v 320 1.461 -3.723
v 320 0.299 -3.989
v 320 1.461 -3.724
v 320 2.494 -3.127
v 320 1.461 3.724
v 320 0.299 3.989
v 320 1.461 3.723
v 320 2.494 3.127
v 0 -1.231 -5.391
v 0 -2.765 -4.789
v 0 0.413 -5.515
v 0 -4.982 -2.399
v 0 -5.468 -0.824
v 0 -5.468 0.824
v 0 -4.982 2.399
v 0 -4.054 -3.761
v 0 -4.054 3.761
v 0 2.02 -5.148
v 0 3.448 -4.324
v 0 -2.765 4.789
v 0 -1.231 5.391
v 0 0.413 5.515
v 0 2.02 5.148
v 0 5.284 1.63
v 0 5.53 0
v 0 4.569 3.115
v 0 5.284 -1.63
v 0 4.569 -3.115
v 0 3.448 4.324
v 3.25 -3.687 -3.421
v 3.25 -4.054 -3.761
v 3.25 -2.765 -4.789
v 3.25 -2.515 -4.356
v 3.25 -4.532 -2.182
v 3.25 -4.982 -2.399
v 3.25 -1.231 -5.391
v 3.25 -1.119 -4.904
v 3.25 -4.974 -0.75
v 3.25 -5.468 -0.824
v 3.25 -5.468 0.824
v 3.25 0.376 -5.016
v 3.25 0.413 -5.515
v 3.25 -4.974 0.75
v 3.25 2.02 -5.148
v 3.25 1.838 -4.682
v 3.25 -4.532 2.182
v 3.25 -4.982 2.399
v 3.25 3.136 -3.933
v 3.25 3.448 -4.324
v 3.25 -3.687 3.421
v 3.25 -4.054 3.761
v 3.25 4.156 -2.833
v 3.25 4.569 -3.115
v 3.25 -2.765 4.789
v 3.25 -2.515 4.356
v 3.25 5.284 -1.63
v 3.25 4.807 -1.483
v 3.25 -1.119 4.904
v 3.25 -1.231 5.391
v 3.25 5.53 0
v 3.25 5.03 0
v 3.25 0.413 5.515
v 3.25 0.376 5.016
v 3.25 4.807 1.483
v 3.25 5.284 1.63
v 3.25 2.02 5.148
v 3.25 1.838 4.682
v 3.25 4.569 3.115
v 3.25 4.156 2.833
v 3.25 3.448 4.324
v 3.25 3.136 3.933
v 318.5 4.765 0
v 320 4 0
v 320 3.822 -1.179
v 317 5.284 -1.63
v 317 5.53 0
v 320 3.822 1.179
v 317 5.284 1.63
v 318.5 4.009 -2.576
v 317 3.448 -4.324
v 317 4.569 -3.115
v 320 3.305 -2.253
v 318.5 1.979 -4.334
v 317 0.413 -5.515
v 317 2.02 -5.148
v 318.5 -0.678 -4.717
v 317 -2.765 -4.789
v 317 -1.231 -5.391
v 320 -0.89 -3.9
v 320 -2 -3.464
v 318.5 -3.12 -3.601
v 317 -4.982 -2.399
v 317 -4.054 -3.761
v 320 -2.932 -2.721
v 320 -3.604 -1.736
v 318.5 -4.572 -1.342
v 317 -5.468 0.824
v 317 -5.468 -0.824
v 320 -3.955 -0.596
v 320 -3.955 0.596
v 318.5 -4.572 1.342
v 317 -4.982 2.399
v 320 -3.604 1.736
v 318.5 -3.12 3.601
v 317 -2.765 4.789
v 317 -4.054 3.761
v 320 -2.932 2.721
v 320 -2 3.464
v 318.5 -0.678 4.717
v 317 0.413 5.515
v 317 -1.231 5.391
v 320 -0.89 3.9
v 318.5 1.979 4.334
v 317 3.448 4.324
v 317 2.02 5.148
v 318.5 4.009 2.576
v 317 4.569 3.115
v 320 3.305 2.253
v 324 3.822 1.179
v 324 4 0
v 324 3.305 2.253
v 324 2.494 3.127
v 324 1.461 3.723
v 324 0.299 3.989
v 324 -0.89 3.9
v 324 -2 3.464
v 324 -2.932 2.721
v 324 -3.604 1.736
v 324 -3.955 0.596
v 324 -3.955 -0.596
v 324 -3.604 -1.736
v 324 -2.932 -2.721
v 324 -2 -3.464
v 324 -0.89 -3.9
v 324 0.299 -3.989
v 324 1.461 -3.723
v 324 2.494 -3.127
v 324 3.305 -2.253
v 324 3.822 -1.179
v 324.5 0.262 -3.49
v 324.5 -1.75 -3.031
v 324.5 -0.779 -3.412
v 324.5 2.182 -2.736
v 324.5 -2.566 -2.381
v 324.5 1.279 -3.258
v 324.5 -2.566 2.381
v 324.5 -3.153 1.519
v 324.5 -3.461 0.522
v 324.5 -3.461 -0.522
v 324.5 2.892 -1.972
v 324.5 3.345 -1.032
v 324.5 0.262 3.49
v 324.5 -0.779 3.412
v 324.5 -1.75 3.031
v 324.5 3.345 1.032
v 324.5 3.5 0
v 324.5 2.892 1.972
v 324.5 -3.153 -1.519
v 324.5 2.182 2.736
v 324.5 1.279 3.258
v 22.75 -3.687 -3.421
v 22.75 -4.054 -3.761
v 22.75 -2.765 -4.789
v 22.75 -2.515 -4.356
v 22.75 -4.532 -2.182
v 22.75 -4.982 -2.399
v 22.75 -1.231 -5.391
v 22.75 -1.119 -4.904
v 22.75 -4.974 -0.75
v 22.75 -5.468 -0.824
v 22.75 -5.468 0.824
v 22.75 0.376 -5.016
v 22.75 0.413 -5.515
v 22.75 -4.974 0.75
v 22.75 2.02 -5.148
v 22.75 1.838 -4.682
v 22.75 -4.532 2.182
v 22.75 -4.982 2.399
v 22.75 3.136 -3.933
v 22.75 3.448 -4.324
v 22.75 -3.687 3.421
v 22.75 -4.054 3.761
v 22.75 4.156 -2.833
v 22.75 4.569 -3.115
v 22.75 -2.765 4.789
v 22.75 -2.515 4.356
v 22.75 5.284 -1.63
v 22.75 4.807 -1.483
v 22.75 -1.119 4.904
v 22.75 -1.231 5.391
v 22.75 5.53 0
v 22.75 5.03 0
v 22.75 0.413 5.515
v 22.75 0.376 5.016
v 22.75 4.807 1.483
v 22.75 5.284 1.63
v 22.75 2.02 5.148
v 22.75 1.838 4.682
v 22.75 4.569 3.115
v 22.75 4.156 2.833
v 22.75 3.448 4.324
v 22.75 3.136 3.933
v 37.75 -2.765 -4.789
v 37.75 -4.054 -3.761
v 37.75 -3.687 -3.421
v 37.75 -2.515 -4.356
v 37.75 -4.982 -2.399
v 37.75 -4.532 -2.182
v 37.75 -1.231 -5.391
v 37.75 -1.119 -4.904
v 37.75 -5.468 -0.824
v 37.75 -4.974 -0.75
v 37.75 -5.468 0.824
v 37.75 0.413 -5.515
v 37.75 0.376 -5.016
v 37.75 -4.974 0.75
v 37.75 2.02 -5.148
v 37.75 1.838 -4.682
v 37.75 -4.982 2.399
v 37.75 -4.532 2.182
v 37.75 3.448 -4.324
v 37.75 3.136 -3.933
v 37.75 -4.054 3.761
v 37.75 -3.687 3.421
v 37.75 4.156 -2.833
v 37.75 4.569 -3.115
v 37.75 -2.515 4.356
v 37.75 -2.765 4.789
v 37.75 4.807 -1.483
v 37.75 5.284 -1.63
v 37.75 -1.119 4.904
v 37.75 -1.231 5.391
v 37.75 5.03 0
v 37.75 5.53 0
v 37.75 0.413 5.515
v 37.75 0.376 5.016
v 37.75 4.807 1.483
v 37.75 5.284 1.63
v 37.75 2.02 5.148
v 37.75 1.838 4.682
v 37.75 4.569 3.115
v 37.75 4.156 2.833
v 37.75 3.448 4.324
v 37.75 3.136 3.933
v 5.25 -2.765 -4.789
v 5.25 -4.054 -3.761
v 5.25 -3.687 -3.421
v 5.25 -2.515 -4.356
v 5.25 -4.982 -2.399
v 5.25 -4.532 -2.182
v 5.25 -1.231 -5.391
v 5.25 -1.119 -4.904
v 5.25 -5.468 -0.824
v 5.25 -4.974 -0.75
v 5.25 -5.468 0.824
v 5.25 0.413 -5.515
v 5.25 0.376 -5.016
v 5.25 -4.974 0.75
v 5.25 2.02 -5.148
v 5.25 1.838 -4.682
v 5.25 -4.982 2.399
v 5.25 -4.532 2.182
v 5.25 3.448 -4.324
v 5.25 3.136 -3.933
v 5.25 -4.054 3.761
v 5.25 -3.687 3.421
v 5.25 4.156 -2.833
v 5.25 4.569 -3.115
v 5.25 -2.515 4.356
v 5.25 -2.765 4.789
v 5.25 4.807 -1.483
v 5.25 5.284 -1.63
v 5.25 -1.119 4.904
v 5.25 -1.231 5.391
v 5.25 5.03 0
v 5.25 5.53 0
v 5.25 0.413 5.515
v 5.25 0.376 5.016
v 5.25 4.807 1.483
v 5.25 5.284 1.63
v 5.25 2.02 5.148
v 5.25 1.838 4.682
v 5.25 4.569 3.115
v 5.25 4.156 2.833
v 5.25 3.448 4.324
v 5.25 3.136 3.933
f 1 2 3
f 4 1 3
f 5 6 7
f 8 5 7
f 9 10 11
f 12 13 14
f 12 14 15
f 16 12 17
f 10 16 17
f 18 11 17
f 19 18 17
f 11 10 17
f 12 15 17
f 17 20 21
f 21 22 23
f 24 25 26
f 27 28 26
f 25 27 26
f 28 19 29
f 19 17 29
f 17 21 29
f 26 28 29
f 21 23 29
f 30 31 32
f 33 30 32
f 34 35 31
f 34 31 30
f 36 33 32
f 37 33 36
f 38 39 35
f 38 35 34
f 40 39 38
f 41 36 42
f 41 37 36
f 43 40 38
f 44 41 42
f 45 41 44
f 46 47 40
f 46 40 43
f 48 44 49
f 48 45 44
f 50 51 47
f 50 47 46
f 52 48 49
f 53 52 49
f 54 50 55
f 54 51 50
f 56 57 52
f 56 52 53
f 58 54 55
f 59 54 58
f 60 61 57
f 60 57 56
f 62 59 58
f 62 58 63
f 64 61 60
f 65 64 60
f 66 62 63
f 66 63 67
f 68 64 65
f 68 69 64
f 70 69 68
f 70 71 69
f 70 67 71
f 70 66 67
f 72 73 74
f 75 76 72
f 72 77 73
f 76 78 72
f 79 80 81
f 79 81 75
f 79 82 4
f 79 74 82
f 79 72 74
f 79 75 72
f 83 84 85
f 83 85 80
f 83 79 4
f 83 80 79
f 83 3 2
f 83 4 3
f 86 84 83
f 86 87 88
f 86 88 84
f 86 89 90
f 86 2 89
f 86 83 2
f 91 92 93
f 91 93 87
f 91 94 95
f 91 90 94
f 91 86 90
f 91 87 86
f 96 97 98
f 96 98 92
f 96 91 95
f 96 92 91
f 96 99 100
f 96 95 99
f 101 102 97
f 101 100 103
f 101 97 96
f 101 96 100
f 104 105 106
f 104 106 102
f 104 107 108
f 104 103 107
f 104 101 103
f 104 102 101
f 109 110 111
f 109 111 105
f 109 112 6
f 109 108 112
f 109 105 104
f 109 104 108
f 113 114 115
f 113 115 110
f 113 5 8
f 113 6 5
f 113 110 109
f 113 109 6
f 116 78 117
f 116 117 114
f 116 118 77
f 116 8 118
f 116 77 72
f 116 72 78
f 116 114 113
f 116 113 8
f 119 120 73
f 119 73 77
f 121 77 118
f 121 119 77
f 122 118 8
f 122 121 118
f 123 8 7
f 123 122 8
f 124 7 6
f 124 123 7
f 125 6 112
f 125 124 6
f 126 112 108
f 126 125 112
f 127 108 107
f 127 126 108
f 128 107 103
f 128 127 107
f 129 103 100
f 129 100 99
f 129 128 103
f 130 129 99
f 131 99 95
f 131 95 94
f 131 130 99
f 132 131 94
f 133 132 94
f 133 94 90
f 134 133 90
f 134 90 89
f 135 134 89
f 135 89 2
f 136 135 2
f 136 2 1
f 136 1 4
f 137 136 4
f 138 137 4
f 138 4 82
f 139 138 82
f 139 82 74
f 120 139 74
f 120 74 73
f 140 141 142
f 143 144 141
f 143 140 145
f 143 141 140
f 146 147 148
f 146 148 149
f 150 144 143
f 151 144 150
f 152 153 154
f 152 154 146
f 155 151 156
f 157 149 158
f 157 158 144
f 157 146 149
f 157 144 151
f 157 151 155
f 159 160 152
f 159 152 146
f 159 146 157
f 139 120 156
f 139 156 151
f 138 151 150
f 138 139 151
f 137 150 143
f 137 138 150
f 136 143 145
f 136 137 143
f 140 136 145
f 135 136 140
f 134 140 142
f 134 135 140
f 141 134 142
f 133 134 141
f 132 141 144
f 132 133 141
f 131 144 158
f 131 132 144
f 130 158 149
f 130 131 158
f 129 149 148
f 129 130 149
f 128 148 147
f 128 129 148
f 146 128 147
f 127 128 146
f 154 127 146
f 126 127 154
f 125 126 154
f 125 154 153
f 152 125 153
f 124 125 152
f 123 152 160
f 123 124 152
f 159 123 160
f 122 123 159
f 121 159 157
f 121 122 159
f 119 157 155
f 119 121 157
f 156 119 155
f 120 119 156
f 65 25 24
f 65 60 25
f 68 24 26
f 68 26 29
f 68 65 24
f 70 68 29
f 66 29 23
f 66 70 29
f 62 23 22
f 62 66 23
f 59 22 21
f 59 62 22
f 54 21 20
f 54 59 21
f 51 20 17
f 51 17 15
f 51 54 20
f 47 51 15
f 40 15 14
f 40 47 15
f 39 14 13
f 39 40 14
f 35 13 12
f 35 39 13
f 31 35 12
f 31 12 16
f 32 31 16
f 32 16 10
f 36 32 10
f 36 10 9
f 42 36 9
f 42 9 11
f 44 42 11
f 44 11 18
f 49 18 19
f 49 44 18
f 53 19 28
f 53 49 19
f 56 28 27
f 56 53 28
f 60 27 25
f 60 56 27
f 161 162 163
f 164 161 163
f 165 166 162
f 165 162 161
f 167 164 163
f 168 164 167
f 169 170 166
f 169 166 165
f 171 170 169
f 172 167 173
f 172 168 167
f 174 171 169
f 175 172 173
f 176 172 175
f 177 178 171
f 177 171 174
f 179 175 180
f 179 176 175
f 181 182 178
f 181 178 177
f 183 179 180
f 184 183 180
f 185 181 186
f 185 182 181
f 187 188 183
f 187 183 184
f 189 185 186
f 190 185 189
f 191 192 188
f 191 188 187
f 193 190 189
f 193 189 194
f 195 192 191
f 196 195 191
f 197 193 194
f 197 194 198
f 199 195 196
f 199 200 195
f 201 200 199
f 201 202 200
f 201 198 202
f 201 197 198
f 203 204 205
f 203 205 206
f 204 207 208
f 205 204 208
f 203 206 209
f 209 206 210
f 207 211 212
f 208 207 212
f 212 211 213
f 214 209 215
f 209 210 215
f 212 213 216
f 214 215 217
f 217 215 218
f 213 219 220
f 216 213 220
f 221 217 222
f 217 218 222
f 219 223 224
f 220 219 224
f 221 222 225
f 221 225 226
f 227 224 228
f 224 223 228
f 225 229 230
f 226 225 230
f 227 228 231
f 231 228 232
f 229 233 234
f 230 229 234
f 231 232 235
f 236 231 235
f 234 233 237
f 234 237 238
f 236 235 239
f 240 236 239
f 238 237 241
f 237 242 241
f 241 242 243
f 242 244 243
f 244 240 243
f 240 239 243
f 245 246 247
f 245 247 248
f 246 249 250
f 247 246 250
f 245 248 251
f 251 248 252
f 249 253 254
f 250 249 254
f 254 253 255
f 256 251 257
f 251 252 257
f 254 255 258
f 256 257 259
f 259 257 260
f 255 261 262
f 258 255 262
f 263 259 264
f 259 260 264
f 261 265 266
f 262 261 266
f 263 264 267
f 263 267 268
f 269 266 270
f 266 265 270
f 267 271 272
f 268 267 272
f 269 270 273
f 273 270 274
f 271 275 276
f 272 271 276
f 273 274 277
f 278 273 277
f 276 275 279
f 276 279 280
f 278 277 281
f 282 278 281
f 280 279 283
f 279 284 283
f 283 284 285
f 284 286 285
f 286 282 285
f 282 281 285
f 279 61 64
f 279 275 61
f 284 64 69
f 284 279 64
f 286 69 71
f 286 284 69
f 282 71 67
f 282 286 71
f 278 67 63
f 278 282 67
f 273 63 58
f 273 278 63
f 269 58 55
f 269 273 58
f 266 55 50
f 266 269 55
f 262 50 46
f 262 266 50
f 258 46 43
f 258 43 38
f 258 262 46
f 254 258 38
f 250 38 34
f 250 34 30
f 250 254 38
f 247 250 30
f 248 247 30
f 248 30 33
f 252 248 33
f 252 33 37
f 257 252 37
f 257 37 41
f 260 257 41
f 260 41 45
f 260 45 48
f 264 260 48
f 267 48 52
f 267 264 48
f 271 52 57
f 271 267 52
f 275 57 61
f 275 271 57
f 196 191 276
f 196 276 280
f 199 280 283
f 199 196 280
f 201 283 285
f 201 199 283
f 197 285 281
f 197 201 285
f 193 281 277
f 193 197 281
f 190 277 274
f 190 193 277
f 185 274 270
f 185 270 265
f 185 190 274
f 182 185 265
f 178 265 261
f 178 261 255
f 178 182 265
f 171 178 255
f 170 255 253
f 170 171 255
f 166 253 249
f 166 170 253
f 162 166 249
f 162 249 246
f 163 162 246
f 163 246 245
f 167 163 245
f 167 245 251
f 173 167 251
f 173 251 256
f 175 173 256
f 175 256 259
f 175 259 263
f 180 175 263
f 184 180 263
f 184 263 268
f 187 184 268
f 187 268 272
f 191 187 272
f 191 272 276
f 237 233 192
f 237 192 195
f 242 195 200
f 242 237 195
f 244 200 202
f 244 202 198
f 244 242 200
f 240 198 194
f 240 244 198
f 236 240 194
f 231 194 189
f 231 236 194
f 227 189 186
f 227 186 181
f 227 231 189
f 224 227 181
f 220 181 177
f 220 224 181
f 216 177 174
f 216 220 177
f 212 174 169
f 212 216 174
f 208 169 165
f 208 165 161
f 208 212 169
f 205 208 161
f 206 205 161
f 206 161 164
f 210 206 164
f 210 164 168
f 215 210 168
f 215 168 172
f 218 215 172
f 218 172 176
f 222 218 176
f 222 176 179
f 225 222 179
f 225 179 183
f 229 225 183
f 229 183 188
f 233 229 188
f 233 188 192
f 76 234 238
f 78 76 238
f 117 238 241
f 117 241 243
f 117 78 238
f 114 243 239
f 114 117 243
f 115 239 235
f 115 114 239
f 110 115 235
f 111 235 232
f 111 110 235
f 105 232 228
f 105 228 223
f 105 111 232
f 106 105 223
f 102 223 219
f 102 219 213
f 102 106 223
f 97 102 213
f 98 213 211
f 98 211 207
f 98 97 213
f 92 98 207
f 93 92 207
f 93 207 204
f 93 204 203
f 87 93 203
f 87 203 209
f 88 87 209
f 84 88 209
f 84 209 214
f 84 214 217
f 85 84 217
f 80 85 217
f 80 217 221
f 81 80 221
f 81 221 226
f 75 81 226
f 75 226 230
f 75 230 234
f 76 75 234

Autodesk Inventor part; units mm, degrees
ref_plane "YZ Plane" through (0, 0, 0) normal (1, 0, 0) x (0, 1, 0)
ref_plane "XZ Plane" through (0, 0, 0) normal (0, 1, 0) x (-1, 0, 0)
ref_plane "XY Plane" through (0, 0, 0) normal (0, 0, 1) x (1, 0, 0)
sketch "Sketch1" plane through (0, 0, 0) normal (0, 0, 1) x (1, 0, 0)
  line L0 (-64.9, 0) -> (389.4, 0) projected
  line L1 (0, 6.636) -> (0, -1.106) projected
  line L2 (0, 0) -> (0, 5.53)
  line L3 (0, 5.53) -> (3.25, 5.53)
  line L4 (3.25, 5.53) -> (3.25, 5.03)
  line L5 (3.25, 5.03) -> (5.25, 5.03)
  line L6 (5.25, 5.03) -> (5.25, 5.53)
  line L7 (5.25, 5.53) -> (22.75, 5.53)
  line L8 (22.75, 5.53) -> (22.75, 5.03)
  line L9 (22.75, 5.03) -> (37.75, 5.03)
  line L10 (37.75, 5.03) -> (37.75, 5.53)
  line L11 (37.75, 5.53) -> (320, 5.53)
  line L12 (320, 5.53) -> (320, 4)
  line L13 (320, 4) -> (324.5, 4)
  line L14 (324.5, 4) -> (324.5, 0)
  line L15 (0, 0) -> (324.5, 0)
  dimension "d0" = 37.75
  dimension "d1" = 15
  dimension "d2" = 17.5
  dimension "d3" = 2
  dimension "d4" = 11.06
  dimension "d5" = 0.5
  dimension "d6" = 0.5
  dimension "d7" = 320
  dimension "d8" = 324.5
  dimension "d9" = 8
revolve "Revolution1" add sketch "Sketch1" angle 360 about axis through (0, 0, 0) along (1, 0, 0)
chamfer "Chamfer1" distance 1.53 distance2 3 1 edges at (320, -5.53, 0) measured on face at (320, 4.9664, -0.4411)
chamfer "Chamfer2" distance 0.5 angle 45 1 edges at (324.5, -4, 0)
thread "Thread1" size "M12x1.75" class "6g" standard "ANSI Metric M Profile" full length
equation "\"d6\" = d5"
properties part number "201-05" material "Stainless Steel"
